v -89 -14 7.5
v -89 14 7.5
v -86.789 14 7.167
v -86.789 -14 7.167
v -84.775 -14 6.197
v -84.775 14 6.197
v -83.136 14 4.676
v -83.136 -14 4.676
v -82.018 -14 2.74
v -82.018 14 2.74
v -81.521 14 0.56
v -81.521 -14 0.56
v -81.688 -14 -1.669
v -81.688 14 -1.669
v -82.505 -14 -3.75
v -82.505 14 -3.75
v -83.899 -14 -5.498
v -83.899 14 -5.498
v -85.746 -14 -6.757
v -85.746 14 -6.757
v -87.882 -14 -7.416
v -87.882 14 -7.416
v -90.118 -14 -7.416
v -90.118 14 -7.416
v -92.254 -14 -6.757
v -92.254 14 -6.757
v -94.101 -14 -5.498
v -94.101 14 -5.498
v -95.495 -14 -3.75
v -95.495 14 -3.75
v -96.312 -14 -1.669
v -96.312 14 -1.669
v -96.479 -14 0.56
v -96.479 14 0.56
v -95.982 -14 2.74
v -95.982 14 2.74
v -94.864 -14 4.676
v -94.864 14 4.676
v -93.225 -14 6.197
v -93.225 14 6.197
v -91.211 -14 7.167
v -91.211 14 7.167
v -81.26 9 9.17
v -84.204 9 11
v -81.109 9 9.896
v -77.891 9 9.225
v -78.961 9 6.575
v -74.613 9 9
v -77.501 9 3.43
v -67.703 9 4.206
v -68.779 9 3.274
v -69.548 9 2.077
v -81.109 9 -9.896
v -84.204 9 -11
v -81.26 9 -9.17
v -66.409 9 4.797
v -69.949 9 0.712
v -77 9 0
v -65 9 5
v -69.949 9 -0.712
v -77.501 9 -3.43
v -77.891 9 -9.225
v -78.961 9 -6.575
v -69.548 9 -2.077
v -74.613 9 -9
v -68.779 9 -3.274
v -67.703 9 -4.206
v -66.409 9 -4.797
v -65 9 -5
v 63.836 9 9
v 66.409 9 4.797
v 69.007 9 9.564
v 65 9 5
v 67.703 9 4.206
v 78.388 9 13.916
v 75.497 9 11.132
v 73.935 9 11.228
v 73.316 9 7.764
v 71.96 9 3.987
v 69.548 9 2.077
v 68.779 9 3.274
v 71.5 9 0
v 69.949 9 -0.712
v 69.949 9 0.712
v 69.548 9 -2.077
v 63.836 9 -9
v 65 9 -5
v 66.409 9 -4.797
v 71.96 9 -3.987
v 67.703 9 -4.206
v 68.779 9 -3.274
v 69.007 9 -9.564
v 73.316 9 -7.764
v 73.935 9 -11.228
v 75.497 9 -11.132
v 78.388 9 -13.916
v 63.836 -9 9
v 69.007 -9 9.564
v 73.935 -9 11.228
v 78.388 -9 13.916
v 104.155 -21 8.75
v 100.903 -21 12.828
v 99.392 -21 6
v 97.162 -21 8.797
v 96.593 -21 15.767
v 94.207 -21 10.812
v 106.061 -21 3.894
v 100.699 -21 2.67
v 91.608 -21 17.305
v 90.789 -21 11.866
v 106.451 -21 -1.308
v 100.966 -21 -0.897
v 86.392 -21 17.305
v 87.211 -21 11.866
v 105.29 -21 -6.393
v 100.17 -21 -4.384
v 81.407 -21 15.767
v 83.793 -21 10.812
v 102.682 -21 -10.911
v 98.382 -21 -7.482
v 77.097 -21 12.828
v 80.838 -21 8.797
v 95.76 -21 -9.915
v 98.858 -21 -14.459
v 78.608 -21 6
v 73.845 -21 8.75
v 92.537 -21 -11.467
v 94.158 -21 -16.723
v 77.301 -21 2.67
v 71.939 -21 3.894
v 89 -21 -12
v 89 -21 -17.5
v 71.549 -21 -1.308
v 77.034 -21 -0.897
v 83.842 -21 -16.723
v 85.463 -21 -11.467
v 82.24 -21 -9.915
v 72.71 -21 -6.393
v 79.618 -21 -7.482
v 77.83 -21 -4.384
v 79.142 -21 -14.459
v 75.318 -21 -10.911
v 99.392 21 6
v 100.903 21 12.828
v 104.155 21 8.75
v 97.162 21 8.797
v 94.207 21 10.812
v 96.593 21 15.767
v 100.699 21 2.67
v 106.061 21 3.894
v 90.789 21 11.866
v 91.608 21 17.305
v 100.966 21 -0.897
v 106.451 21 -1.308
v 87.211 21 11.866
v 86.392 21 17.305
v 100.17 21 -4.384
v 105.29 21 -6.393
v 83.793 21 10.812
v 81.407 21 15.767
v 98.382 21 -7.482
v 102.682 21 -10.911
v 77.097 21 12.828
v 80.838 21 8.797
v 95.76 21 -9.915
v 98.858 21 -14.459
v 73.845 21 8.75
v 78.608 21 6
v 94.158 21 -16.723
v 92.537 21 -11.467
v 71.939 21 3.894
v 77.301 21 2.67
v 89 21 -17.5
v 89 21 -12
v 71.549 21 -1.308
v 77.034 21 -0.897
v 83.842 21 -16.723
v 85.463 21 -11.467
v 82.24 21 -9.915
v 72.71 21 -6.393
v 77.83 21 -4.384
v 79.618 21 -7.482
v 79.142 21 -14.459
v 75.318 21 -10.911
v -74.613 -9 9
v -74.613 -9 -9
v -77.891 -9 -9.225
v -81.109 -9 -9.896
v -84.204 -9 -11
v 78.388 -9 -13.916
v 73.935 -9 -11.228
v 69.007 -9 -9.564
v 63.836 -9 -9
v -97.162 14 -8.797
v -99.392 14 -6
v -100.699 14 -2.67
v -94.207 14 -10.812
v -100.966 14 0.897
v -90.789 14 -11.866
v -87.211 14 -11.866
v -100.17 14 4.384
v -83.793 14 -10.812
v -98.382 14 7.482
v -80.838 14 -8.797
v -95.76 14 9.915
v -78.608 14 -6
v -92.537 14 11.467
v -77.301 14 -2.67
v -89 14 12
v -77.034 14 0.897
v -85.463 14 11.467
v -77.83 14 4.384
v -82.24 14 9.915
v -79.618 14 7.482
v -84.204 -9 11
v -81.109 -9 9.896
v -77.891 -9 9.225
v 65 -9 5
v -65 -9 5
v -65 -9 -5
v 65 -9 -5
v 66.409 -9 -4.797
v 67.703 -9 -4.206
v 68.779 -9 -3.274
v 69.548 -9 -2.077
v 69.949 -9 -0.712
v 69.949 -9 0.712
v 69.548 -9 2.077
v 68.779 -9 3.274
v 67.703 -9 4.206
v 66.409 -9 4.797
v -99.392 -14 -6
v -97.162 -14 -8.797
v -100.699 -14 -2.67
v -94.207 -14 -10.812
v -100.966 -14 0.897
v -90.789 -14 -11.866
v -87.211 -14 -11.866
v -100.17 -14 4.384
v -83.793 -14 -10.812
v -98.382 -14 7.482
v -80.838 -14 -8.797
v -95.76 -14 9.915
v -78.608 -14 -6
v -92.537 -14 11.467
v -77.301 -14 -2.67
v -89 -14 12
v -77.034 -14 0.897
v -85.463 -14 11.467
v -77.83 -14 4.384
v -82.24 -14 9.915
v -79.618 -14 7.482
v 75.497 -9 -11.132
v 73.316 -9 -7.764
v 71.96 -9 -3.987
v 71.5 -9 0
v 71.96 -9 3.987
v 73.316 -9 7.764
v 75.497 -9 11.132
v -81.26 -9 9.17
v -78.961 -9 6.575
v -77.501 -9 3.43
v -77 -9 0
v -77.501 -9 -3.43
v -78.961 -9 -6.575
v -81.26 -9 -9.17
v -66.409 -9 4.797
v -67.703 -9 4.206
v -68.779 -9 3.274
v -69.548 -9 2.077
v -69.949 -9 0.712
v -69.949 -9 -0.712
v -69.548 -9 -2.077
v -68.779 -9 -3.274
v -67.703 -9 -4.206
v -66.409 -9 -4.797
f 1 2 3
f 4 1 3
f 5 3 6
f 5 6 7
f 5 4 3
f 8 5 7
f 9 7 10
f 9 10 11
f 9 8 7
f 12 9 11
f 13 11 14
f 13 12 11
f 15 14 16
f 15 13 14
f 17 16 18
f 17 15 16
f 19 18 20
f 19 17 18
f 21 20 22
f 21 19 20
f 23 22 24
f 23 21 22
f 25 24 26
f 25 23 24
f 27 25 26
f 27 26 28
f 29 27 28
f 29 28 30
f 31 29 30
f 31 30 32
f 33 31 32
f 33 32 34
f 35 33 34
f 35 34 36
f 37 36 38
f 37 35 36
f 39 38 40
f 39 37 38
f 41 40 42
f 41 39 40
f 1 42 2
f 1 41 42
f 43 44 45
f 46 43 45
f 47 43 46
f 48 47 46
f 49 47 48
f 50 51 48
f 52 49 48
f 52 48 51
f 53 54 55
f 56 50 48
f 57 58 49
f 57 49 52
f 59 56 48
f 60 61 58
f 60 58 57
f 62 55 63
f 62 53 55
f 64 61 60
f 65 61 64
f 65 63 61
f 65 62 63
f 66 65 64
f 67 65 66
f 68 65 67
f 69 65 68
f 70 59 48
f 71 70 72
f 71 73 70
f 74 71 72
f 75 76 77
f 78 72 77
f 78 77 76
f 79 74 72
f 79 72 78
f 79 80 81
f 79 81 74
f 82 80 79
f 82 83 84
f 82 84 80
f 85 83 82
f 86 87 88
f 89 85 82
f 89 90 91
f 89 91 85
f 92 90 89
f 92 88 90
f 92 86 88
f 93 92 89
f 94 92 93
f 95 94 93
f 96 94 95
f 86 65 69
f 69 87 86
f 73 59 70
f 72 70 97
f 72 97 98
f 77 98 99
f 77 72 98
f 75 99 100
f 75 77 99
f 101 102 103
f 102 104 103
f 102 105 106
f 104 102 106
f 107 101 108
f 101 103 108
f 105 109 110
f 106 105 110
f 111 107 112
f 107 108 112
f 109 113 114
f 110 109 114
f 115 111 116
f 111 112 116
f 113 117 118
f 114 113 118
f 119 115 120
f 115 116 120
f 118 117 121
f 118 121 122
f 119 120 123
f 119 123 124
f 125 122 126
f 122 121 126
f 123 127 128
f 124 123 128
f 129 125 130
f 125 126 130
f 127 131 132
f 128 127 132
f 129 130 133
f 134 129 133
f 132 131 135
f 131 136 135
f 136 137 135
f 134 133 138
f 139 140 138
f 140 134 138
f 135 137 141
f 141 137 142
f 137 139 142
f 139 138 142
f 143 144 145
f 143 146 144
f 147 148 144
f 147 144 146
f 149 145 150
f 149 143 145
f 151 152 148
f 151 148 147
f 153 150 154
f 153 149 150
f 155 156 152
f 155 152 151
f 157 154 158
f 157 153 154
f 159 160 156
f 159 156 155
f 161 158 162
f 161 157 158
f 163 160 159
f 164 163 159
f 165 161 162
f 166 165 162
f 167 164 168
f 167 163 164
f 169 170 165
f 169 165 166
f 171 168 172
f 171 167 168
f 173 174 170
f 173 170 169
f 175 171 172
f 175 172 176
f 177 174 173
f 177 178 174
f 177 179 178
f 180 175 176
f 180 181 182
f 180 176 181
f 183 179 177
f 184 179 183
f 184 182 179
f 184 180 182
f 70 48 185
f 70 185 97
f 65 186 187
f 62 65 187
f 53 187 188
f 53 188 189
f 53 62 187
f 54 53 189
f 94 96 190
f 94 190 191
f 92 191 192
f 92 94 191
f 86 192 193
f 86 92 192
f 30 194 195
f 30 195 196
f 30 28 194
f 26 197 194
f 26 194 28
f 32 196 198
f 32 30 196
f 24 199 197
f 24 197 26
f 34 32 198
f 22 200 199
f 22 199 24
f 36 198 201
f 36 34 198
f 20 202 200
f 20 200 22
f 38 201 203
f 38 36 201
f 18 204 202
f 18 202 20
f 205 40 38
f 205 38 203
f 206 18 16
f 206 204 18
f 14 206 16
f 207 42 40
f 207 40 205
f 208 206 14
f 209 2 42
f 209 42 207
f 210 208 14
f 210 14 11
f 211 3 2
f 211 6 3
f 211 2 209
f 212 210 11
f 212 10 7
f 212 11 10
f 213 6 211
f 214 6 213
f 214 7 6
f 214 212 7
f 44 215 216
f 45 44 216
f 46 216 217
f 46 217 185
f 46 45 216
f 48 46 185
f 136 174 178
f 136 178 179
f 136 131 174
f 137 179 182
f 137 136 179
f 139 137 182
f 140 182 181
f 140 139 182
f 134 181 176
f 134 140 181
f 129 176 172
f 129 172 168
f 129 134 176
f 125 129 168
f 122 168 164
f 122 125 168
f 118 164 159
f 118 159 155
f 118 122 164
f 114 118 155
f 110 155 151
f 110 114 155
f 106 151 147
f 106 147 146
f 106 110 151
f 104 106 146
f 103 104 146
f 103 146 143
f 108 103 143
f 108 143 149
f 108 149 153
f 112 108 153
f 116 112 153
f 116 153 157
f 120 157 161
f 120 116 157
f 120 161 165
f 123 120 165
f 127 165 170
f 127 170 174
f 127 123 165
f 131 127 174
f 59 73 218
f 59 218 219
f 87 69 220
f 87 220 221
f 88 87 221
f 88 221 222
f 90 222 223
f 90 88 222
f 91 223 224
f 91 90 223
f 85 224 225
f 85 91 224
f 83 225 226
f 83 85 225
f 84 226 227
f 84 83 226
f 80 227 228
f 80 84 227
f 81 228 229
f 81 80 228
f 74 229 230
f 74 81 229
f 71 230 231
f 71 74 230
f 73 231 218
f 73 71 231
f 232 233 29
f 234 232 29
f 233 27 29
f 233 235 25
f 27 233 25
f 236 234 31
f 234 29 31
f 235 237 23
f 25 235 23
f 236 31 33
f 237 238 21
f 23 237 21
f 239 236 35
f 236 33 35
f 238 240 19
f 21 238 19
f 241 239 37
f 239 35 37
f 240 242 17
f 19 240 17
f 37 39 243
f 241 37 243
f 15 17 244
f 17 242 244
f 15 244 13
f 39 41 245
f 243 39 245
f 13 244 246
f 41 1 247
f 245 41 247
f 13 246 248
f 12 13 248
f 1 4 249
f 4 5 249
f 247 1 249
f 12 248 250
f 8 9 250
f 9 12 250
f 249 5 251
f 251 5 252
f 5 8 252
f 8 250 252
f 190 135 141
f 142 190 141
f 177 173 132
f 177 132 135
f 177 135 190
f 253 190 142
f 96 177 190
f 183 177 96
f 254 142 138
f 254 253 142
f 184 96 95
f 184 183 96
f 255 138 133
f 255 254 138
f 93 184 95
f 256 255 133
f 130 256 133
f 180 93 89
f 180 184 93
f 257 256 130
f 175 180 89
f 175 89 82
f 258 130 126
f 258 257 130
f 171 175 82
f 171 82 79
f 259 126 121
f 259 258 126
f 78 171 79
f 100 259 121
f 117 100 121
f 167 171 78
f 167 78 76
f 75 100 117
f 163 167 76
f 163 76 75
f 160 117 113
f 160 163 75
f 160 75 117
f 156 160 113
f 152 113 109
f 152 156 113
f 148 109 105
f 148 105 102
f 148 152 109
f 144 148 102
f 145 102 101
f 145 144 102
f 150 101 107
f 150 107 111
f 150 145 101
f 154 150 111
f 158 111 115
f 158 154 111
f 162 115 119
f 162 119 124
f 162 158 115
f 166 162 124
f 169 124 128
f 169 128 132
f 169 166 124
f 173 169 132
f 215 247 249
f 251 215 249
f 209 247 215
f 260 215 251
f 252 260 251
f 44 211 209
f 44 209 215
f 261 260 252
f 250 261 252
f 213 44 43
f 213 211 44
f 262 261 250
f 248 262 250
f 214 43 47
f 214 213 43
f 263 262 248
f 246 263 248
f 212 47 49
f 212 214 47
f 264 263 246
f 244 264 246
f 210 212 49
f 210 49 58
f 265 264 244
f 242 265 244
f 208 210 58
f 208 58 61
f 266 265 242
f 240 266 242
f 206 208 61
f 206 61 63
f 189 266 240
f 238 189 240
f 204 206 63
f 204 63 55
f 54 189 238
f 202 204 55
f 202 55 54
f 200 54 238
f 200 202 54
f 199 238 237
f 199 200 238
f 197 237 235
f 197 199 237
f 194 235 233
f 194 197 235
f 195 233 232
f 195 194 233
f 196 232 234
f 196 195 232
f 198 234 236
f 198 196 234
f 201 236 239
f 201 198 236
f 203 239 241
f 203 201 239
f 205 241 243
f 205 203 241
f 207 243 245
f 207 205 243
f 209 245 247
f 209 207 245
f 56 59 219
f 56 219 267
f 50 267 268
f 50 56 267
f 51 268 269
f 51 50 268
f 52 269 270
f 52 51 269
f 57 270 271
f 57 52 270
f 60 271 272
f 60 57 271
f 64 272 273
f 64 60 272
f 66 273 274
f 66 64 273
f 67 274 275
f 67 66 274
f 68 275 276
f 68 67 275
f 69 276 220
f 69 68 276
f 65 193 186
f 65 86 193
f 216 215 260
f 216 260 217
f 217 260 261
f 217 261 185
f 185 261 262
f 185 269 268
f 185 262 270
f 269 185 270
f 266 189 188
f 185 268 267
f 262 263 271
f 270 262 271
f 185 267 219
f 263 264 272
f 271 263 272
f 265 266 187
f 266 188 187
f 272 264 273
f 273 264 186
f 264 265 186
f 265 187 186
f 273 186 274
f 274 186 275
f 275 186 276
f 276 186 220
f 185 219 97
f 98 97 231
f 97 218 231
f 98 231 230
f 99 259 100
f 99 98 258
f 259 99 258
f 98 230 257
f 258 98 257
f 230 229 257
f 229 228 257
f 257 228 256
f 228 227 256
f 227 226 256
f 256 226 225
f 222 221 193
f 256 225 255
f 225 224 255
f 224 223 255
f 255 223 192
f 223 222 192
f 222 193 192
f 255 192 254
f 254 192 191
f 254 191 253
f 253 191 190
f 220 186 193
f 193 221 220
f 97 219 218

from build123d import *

# Parameters (mm, degrees)
SKETCH1_R           = 7.5
BOSS_EXTRUDE1_DEPTH = 14
SKETCH1_6_R         = 12
BOSS_EXTRUDE2_DEPTH = 21
BOSS_EXTRUDE3_DEPTH = 9
CUT_EXTRUDE1_REACH  = 114.02


with BuildPart() as part:
    # Sketch1 → Boss-Extrude1 (new, symmetric)
    with BuildSketch(Plane(origin=(0, 0, 0), x_dir=(1, 0, 0), z_dir=(0, 1, 0))):
        with BuildLine():
            ThreePointArc((-77, 0), (-78.96132533, 6.574573055), (-84.204168477, 11))
            ThreePointArc((-84.204168477, 11), (-101, 0), (-84.204168477, -11))
            ThreePointArc((-84.204168477, -11), (-78.96132533, -6.574573055), (-77, 0))
        make_face()
        with Locations((-89, 0)):
            Circle(SKETCH1_R, mode=Mode.SUBTRACT)
    extrude(amount=BOSS_EXTRUDE1_DEPTH, both=True)



with BuildPart() as body_2:
    # Sketch1<6> → Boss-Extrude2 (new, symmetric)
    with BuildSketch(Plane(origin=(0, 0, 0), x_dir=(1, 0, 0), z_dir=(0, 1, 0))):
        with BuildLine():
            ThreePointArc((106.5, 0), (96.76364668, 15.683615343), (78.388481117, 13.915662651))
            ThreePointArc((78.388481117, 13.915662651), (71.5, 0), (78.388481117, -13.915662651))
            ThreePointArc((78.388481117, -13.915662651), (96.76364668, -15.683615343), (106.5, 0))
        make_face()
        with Locations((89, 0)):
            Circle(SKETCH1_6_R, mode=Mode.SUBTRACT)
    extrude(amount=BOSS_EXTRUDE2_DEPTH, both=True)


with BuildPart() as part_1:
    add(part.part)

    add(body_2.part)  # Boss-Extrude3 merges body 2
    # Sketch1<7> → Boss-Extrude3 (add, symmetric)
    with BuildSketch(Plane(origin=(0, 0, 0), x_dir=(1, 0, 0), z_dir=(0, 1, 0))):
        with BuildLine():
            ThreePointArc((-84.204168477, 11), (-77, 0), (-84.204168477, -11))
            ThreePointArc((-84.204168477, -11), (-79.511484916, -9.505319751), (-74.61250543, -9))
            Line((-74.61250543, -9), (63.835540936, -9))
            ThreePointArc((63.835540936, -9), (71.515902373, -10.26210106), (78.388481117, -13.915662651))
            ThreePointArc((78.388481117, -13.915662651), (71.5, 0), (78.388481117, 13.915662651))
            ThreePointArc((78.388481117, 13.915662651), (71.515902373, 10.26210106), (63.835540936, 9))
            Line((63.835540936, 9), (-74.61250543, 9))
            ThreePointArc((-74.61250543, 9), (-79.511484916, 9.505319751), (-84.204168477, 11))
        make_face()
    extrude(amount=BOSS_EXTRUDE3_DEPTH, both=True)

    # Sketch2 → Cut-Extrude1 (cut, up to next)
    with BuildSketch(Plane(origin=(0, 9, 0), x_dir=(1, 0, 0), z_dir=(0, 1, 0)), mode=Mode.PRIVATE) as cut_extrude1_sk1:
        with BuildLine():
            Line((-65, 5), (65, 5))
            ThreePointArc((65, 5), (70, 0), (65, -5))
            Line((65, -5), (-65, -5))
            ThreePointArc((-65, -5), (-70, 0), (-65, 5))
        make_face()
    cut_extrude1_tool1 = extrude(cut_extrude1_sk1.sketch, amount=-CUT_EXTRUDE1_REACH, mode=Mode.PRIVATE) & part_1.part
    add(cut_extrude1_tool1.solids().sort_by_distance((0, 9, 0))[0], mode=Mode.SUBTRACT)


solid = part_1.part
